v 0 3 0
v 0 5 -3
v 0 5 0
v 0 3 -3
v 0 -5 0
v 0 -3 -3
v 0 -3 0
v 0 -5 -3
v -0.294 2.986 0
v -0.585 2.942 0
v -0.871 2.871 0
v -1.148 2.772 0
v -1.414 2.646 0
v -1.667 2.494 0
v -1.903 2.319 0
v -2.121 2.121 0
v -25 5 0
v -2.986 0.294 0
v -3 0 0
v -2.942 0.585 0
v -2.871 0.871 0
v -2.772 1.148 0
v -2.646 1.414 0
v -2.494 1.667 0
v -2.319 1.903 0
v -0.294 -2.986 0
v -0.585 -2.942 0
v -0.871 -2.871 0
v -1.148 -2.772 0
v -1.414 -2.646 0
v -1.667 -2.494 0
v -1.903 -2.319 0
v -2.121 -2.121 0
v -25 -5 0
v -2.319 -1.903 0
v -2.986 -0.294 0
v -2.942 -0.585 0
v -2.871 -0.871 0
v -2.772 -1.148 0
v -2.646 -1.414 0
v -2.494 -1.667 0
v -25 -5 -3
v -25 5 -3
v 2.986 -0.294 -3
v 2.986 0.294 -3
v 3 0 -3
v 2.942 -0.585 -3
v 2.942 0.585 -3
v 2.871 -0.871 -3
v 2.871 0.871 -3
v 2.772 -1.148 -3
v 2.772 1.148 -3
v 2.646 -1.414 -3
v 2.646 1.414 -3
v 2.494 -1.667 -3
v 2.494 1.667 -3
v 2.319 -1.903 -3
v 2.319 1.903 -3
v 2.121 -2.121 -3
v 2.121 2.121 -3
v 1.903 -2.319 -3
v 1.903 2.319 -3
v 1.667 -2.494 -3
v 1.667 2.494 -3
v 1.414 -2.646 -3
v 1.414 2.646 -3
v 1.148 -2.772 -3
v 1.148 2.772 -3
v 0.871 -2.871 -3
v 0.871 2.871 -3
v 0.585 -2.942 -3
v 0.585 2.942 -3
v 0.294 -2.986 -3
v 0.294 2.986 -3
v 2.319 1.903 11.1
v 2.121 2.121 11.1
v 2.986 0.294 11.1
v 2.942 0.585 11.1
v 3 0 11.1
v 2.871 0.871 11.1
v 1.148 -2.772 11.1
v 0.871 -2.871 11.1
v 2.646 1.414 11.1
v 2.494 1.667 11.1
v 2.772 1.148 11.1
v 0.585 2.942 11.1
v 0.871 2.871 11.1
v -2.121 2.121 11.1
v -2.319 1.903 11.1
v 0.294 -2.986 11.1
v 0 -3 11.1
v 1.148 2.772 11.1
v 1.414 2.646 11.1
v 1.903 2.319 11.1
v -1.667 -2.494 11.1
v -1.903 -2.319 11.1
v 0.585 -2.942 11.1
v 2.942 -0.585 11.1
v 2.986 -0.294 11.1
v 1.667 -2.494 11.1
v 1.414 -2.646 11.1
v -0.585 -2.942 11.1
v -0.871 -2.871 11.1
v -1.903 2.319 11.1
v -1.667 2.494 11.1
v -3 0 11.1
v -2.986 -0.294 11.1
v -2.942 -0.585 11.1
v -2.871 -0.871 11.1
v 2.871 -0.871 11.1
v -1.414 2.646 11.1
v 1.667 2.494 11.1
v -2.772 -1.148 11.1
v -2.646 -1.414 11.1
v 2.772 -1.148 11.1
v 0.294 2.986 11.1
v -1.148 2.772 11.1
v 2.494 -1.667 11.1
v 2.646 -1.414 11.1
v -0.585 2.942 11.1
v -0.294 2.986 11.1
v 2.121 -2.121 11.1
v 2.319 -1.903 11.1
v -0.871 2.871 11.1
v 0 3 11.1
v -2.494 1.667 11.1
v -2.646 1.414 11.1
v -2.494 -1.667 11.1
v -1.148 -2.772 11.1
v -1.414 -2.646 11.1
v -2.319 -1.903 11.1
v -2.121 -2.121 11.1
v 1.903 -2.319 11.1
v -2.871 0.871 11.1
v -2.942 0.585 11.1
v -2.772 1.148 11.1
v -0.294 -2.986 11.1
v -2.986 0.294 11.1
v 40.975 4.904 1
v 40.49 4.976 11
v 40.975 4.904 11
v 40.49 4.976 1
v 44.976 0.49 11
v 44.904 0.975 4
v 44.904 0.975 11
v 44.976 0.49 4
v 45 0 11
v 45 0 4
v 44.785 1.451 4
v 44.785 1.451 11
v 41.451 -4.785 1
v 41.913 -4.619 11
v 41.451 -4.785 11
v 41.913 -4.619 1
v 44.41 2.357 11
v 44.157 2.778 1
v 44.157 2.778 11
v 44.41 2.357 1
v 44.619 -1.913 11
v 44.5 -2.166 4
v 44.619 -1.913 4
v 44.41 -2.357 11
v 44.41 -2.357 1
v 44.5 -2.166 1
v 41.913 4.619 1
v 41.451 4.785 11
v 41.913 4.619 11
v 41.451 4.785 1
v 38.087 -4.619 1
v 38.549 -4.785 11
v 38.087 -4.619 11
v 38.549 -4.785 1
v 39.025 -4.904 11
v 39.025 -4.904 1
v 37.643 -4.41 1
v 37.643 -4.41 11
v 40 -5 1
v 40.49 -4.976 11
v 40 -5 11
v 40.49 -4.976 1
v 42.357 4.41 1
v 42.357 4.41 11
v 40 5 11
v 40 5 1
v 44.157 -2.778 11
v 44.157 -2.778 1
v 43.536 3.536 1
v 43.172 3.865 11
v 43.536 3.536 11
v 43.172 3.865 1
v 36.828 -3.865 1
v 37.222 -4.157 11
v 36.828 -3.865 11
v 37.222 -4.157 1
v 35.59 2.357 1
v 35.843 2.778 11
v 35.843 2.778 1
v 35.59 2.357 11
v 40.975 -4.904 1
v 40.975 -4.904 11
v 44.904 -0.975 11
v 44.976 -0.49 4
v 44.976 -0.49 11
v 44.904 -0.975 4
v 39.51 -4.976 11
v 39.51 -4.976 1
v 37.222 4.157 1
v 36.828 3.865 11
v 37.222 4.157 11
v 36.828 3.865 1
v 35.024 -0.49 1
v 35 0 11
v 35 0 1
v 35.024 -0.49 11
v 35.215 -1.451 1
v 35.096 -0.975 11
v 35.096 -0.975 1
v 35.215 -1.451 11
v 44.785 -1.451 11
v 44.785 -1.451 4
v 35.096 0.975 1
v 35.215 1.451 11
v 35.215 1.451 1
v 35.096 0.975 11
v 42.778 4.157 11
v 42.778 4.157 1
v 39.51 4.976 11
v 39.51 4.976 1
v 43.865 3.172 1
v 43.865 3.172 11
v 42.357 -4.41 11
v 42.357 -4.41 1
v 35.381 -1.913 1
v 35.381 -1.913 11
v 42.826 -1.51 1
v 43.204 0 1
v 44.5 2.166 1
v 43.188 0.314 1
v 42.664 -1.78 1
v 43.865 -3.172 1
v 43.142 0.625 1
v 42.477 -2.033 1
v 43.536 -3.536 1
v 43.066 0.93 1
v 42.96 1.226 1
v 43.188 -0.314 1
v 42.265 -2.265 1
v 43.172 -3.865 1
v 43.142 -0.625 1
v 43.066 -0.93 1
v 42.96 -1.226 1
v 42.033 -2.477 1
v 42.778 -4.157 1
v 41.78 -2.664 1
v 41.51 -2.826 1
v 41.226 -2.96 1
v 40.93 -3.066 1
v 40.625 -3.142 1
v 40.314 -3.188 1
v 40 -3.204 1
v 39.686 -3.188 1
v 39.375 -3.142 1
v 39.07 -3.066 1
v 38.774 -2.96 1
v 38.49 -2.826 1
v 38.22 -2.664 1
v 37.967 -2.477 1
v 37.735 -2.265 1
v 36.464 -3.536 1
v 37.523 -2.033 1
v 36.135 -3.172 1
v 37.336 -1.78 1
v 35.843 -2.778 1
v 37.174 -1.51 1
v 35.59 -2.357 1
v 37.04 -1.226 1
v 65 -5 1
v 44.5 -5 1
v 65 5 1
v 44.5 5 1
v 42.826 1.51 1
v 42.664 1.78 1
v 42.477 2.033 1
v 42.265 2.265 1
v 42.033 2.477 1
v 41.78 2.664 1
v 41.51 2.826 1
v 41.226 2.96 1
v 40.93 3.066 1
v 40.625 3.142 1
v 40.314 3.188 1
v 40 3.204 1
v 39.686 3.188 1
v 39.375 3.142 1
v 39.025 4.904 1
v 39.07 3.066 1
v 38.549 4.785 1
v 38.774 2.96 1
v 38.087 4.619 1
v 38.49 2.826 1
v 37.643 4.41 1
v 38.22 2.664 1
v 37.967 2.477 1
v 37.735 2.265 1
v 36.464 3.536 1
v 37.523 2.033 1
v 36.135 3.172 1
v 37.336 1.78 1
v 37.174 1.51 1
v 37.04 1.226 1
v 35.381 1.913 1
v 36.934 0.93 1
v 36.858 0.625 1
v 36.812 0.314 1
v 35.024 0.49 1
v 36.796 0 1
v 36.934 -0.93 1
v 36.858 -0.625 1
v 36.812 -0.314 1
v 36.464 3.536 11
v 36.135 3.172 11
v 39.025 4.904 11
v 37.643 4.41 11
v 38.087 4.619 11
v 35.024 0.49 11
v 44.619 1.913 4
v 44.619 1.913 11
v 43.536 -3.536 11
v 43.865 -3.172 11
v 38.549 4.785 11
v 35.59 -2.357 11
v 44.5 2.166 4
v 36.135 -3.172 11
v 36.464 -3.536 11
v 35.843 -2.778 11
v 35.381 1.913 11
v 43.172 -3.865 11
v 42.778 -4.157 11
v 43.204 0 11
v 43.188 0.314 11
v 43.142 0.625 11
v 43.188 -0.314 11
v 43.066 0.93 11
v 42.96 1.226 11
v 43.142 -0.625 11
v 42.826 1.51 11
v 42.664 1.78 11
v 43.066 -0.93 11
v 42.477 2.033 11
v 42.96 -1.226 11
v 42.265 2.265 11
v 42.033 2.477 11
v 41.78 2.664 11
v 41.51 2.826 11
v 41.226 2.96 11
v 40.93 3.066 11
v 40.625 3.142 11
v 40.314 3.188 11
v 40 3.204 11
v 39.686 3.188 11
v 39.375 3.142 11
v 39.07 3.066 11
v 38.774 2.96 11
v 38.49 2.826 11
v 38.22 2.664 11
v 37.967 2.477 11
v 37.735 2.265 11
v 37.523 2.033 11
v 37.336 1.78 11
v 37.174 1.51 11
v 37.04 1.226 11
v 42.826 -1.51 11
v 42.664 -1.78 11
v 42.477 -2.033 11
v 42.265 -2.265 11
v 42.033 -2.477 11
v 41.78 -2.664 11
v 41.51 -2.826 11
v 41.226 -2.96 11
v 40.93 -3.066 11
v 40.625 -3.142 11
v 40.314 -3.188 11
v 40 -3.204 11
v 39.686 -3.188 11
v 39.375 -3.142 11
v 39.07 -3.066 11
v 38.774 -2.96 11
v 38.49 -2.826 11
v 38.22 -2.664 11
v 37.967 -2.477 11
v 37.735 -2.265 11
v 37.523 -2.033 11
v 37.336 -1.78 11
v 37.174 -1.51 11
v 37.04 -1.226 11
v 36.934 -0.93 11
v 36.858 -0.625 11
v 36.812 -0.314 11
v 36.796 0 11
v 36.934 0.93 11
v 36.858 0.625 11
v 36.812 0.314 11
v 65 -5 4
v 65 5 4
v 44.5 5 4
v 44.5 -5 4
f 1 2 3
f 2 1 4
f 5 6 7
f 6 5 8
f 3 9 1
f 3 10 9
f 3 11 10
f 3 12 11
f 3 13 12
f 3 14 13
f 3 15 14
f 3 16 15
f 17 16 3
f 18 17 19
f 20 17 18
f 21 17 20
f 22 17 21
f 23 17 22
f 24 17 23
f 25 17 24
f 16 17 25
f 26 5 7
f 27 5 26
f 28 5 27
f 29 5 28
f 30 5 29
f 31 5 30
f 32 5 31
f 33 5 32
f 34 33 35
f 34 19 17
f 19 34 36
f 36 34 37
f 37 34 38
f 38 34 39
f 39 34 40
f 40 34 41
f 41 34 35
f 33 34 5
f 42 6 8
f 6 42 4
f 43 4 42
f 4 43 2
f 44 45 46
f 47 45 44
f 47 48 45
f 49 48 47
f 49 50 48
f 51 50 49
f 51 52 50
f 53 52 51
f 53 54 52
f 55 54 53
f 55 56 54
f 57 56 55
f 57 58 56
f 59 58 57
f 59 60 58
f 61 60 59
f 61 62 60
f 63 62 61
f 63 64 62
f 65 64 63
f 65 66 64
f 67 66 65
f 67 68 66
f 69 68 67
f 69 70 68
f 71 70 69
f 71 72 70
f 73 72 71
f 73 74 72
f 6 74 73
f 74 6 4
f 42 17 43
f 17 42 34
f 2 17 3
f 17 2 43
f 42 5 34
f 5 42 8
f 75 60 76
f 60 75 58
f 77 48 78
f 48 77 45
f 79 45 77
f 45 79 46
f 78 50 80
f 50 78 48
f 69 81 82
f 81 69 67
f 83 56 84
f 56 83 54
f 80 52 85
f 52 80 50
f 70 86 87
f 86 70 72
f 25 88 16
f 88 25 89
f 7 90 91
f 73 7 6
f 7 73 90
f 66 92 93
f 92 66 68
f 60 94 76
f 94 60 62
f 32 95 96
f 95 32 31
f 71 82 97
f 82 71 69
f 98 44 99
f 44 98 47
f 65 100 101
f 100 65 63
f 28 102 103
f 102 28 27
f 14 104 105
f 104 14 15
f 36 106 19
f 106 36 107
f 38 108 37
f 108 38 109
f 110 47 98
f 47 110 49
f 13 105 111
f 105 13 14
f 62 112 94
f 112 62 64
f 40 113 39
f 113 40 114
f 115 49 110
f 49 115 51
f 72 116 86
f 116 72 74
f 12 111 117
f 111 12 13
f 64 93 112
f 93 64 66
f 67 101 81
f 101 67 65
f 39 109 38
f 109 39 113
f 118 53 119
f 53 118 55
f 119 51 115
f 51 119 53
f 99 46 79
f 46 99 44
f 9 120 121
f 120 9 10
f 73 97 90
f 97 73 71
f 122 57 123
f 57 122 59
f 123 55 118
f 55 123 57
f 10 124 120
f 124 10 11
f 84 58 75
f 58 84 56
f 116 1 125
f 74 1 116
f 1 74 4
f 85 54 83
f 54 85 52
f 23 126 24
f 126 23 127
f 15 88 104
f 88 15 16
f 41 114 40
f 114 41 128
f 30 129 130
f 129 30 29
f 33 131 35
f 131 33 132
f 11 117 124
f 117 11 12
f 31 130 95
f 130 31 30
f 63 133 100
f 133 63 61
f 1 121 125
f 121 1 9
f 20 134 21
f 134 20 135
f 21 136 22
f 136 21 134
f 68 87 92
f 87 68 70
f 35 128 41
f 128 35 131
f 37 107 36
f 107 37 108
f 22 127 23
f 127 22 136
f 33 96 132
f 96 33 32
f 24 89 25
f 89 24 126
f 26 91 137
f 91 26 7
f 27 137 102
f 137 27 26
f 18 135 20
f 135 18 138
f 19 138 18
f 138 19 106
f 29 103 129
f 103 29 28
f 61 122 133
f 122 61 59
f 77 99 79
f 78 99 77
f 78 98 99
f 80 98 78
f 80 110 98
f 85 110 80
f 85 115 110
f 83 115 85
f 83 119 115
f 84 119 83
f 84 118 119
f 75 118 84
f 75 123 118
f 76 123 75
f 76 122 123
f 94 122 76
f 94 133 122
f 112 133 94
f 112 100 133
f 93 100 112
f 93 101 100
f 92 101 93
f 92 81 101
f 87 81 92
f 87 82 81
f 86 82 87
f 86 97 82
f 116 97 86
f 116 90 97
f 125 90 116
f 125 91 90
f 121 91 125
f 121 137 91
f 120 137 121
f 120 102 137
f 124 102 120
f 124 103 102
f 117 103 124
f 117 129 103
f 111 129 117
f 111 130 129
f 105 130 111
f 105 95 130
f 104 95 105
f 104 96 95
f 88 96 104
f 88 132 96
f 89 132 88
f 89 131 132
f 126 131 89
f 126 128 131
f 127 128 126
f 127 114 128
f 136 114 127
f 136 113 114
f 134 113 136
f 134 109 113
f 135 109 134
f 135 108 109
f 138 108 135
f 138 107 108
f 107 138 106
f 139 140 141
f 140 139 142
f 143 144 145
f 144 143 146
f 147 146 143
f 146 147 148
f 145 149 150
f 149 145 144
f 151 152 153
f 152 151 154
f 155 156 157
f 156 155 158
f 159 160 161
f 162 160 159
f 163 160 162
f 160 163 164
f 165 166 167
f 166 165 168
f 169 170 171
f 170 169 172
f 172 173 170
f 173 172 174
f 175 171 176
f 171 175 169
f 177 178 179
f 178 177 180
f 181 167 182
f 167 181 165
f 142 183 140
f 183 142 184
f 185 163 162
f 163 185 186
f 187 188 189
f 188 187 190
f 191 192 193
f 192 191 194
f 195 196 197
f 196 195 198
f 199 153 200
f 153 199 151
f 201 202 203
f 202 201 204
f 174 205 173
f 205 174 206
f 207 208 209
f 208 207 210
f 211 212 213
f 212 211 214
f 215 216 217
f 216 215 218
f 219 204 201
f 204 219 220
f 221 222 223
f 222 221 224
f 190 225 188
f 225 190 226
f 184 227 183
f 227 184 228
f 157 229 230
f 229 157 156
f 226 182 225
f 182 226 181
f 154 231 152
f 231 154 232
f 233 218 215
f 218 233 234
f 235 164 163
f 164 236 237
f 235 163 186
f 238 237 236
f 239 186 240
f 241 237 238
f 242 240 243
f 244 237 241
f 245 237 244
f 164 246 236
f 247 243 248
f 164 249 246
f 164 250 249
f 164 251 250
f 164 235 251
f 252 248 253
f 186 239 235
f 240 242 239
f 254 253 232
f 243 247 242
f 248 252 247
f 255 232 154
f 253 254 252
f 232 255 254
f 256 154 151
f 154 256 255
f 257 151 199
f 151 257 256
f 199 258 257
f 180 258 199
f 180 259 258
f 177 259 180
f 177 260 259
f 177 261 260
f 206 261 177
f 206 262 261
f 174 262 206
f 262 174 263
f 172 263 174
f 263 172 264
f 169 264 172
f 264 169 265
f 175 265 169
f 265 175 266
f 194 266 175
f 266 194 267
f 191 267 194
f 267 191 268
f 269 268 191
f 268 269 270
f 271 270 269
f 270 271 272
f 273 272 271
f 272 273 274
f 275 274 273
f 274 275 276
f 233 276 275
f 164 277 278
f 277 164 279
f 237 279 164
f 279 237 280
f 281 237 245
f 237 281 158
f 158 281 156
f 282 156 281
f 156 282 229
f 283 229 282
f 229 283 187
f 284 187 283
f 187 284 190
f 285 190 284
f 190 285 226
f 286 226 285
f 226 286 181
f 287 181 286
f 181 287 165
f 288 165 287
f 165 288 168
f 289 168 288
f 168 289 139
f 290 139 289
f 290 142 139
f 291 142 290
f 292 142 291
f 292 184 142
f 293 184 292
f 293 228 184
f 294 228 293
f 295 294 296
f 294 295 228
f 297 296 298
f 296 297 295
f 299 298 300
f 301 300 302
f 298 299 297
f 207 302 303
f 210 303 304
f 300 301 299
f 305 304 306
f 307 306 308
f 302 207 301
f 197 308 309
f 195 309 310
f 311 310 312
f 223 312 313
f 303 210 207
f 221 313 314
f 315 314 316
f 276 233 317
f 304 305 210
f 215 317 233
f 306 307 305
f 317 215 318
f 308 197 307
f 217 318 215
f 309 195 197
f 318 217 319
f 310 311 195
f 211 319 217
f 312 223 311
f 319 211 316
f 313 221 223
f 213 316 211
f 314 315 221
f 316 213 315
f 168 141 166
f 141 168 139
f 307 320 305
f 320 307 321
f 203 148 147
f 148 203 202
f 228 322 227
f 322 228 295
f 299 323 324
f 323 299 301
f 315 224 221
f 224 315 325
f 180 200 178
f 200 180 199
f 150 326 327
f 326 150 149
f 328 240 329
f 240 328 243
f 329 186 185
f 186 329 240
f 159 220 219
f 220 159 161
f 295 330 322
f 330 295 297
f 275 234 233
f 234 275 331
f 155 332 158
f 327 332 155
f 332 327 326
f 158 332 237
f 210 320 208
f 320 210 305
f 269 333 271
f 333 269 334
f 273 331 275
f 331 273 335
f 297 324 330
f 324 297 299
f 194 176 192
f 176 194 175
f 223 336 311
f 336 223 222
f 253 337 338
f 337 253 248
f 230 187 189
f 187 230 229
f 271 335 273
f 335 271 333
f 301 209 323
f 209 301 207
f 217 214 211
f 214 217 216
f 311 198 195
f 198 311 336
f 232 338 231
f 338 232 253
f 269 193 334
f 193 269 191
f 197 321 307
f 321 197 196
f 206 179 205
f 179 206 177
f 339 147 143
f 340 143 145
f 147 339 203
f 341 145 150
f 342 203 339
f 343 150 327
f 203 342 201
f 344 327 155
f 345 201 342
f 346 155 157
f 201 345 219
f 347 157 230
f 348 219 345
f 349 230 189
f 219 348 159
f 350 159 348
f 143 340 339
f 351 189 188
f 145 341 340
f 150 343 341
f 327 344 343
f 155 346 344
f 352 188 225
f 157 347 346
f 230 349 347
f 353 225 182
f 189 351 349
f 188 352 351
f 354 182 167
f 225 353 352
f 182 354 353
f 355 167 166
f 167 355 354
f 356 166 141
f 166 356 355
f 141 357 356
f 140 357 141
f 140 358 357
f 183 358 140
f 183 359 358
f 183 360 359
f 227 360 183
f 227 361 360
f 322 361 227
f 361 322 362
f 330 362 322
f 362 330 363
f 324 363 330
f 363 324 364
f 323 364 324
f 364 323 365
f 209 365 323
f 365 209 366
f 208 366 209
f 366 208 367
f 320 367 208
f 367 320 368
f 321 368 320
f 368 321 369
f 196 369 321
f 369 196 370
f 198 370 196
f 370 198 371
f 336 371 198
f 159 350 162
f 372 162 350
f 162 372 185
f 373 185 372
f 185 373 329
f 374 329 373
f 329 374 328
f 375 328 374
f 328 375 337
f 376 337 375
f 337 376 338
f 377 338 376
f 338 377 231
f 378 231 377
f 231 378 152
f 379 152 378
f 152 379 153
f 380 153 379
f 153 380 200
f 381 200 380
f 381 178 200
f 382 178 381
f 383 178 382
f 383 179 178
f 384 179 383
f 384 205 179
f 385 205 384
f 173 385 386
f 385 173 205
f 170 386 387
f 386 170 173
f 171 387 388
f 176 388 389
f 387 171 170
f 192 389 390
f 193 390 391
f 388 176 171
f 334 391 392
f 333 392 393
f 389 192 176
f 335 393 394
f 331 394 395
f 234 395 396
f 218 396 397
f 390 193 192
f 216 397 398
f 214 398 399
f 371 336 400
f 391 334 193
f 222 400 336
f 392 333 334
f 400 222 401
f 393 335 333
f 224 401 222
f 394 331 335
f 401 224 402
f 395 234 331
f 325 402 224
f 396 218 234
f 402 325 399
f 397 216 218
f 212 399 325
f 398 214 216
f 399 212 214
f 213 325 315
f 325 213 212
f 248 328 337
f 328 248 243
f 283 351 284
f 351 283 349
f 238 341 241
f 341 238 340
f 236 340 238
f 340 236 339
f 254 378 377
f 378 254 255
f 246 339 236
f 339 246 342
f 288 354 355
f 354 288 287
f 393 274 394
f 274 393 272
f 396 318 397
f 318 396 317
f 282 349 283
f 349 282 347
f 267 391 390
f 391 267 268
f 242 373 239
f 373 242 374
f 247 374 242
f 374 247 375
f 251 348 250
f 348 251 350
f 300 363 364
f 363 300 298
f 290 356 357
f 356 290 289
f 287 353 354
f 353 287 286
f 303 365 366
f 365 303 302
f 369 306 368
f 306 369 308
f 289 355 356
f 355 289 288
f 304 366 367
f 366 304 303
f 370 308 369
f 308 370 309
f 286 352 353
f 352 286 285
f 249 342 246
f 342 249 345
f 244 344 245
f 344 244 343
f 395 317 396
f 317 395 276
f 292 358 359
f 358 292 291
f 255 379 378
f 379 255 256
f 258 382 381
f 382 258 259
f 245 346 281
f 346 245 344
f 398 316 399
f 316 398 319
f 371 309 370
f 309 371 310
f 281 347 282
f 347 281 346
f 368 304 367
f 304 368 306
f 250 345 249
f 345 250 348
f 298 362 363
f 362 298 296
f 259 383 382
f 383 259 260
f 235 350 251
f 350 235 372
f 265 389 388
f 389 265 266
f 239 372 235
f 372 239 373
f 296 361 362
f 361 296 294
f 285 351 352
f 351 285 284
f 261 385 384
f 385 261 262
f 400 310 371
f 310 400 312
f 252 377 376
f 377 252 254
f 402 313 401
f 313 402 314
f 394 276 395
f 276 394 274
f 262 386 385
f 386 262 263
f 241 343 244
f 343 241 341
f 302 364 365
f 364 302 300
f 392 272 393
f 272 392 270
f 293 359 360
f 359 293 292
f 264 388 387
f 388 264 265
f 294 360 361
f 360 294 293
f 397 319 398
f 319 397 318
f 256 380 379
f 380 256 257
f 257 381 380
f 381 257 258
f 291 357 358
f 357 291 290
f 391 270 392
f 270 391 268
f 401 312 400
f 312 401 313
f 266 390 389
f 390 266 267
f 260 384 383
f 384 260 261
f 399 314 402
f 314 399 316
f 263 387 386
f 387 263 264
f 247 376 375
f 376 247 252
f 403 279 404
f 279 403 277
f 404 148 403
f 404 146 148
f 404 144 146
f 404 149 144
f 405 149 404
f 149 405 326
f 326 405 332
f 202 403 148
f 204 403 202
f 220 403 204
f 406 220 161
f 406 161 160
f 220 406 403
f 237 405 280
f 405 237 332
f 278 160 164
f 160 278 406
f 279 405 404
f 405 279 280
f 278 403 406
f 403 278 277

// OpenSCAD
// Adversarial: two separate solids that never form a joint.
// They do not interfere at any pose and they separate along the axis, so a
// benchmark that only checked collision would pass this. The fit measurement
// is what has to notice that no bore was ever produced.
agentscad_part = "all";
$fn = 64;

module fixed_leaf() {
  union() {
    translate([-25, -5, -3]) cube([25, 10, 3]);
    translate([0, 0, -3]) cylinder(h = 14.1, d = 6);
  }
}

module moving_leaf() {
  // Translation of the whole moving part away from the declared axis.
  translate([40, 0, 0]) union() {
    difference() {
      translate([0, 0, 1]) cylinder(h = 10, d = 10);
      translate([0, 0, 0.9]) cylinder(h = 10.2, d = 6.40 / cos(180 / $fn));
    }
    translate([4.5, -5, 1]) cube([20.5, 10, 3]);
  }
}

module generated_part() {
  if (agentscad_part == "all" || agentscad_part == "fixed") fixed_leaf();
  if (agentscad_part == "all" || agentscad_part == "moving") moving_leaf();
}

generated_part();
